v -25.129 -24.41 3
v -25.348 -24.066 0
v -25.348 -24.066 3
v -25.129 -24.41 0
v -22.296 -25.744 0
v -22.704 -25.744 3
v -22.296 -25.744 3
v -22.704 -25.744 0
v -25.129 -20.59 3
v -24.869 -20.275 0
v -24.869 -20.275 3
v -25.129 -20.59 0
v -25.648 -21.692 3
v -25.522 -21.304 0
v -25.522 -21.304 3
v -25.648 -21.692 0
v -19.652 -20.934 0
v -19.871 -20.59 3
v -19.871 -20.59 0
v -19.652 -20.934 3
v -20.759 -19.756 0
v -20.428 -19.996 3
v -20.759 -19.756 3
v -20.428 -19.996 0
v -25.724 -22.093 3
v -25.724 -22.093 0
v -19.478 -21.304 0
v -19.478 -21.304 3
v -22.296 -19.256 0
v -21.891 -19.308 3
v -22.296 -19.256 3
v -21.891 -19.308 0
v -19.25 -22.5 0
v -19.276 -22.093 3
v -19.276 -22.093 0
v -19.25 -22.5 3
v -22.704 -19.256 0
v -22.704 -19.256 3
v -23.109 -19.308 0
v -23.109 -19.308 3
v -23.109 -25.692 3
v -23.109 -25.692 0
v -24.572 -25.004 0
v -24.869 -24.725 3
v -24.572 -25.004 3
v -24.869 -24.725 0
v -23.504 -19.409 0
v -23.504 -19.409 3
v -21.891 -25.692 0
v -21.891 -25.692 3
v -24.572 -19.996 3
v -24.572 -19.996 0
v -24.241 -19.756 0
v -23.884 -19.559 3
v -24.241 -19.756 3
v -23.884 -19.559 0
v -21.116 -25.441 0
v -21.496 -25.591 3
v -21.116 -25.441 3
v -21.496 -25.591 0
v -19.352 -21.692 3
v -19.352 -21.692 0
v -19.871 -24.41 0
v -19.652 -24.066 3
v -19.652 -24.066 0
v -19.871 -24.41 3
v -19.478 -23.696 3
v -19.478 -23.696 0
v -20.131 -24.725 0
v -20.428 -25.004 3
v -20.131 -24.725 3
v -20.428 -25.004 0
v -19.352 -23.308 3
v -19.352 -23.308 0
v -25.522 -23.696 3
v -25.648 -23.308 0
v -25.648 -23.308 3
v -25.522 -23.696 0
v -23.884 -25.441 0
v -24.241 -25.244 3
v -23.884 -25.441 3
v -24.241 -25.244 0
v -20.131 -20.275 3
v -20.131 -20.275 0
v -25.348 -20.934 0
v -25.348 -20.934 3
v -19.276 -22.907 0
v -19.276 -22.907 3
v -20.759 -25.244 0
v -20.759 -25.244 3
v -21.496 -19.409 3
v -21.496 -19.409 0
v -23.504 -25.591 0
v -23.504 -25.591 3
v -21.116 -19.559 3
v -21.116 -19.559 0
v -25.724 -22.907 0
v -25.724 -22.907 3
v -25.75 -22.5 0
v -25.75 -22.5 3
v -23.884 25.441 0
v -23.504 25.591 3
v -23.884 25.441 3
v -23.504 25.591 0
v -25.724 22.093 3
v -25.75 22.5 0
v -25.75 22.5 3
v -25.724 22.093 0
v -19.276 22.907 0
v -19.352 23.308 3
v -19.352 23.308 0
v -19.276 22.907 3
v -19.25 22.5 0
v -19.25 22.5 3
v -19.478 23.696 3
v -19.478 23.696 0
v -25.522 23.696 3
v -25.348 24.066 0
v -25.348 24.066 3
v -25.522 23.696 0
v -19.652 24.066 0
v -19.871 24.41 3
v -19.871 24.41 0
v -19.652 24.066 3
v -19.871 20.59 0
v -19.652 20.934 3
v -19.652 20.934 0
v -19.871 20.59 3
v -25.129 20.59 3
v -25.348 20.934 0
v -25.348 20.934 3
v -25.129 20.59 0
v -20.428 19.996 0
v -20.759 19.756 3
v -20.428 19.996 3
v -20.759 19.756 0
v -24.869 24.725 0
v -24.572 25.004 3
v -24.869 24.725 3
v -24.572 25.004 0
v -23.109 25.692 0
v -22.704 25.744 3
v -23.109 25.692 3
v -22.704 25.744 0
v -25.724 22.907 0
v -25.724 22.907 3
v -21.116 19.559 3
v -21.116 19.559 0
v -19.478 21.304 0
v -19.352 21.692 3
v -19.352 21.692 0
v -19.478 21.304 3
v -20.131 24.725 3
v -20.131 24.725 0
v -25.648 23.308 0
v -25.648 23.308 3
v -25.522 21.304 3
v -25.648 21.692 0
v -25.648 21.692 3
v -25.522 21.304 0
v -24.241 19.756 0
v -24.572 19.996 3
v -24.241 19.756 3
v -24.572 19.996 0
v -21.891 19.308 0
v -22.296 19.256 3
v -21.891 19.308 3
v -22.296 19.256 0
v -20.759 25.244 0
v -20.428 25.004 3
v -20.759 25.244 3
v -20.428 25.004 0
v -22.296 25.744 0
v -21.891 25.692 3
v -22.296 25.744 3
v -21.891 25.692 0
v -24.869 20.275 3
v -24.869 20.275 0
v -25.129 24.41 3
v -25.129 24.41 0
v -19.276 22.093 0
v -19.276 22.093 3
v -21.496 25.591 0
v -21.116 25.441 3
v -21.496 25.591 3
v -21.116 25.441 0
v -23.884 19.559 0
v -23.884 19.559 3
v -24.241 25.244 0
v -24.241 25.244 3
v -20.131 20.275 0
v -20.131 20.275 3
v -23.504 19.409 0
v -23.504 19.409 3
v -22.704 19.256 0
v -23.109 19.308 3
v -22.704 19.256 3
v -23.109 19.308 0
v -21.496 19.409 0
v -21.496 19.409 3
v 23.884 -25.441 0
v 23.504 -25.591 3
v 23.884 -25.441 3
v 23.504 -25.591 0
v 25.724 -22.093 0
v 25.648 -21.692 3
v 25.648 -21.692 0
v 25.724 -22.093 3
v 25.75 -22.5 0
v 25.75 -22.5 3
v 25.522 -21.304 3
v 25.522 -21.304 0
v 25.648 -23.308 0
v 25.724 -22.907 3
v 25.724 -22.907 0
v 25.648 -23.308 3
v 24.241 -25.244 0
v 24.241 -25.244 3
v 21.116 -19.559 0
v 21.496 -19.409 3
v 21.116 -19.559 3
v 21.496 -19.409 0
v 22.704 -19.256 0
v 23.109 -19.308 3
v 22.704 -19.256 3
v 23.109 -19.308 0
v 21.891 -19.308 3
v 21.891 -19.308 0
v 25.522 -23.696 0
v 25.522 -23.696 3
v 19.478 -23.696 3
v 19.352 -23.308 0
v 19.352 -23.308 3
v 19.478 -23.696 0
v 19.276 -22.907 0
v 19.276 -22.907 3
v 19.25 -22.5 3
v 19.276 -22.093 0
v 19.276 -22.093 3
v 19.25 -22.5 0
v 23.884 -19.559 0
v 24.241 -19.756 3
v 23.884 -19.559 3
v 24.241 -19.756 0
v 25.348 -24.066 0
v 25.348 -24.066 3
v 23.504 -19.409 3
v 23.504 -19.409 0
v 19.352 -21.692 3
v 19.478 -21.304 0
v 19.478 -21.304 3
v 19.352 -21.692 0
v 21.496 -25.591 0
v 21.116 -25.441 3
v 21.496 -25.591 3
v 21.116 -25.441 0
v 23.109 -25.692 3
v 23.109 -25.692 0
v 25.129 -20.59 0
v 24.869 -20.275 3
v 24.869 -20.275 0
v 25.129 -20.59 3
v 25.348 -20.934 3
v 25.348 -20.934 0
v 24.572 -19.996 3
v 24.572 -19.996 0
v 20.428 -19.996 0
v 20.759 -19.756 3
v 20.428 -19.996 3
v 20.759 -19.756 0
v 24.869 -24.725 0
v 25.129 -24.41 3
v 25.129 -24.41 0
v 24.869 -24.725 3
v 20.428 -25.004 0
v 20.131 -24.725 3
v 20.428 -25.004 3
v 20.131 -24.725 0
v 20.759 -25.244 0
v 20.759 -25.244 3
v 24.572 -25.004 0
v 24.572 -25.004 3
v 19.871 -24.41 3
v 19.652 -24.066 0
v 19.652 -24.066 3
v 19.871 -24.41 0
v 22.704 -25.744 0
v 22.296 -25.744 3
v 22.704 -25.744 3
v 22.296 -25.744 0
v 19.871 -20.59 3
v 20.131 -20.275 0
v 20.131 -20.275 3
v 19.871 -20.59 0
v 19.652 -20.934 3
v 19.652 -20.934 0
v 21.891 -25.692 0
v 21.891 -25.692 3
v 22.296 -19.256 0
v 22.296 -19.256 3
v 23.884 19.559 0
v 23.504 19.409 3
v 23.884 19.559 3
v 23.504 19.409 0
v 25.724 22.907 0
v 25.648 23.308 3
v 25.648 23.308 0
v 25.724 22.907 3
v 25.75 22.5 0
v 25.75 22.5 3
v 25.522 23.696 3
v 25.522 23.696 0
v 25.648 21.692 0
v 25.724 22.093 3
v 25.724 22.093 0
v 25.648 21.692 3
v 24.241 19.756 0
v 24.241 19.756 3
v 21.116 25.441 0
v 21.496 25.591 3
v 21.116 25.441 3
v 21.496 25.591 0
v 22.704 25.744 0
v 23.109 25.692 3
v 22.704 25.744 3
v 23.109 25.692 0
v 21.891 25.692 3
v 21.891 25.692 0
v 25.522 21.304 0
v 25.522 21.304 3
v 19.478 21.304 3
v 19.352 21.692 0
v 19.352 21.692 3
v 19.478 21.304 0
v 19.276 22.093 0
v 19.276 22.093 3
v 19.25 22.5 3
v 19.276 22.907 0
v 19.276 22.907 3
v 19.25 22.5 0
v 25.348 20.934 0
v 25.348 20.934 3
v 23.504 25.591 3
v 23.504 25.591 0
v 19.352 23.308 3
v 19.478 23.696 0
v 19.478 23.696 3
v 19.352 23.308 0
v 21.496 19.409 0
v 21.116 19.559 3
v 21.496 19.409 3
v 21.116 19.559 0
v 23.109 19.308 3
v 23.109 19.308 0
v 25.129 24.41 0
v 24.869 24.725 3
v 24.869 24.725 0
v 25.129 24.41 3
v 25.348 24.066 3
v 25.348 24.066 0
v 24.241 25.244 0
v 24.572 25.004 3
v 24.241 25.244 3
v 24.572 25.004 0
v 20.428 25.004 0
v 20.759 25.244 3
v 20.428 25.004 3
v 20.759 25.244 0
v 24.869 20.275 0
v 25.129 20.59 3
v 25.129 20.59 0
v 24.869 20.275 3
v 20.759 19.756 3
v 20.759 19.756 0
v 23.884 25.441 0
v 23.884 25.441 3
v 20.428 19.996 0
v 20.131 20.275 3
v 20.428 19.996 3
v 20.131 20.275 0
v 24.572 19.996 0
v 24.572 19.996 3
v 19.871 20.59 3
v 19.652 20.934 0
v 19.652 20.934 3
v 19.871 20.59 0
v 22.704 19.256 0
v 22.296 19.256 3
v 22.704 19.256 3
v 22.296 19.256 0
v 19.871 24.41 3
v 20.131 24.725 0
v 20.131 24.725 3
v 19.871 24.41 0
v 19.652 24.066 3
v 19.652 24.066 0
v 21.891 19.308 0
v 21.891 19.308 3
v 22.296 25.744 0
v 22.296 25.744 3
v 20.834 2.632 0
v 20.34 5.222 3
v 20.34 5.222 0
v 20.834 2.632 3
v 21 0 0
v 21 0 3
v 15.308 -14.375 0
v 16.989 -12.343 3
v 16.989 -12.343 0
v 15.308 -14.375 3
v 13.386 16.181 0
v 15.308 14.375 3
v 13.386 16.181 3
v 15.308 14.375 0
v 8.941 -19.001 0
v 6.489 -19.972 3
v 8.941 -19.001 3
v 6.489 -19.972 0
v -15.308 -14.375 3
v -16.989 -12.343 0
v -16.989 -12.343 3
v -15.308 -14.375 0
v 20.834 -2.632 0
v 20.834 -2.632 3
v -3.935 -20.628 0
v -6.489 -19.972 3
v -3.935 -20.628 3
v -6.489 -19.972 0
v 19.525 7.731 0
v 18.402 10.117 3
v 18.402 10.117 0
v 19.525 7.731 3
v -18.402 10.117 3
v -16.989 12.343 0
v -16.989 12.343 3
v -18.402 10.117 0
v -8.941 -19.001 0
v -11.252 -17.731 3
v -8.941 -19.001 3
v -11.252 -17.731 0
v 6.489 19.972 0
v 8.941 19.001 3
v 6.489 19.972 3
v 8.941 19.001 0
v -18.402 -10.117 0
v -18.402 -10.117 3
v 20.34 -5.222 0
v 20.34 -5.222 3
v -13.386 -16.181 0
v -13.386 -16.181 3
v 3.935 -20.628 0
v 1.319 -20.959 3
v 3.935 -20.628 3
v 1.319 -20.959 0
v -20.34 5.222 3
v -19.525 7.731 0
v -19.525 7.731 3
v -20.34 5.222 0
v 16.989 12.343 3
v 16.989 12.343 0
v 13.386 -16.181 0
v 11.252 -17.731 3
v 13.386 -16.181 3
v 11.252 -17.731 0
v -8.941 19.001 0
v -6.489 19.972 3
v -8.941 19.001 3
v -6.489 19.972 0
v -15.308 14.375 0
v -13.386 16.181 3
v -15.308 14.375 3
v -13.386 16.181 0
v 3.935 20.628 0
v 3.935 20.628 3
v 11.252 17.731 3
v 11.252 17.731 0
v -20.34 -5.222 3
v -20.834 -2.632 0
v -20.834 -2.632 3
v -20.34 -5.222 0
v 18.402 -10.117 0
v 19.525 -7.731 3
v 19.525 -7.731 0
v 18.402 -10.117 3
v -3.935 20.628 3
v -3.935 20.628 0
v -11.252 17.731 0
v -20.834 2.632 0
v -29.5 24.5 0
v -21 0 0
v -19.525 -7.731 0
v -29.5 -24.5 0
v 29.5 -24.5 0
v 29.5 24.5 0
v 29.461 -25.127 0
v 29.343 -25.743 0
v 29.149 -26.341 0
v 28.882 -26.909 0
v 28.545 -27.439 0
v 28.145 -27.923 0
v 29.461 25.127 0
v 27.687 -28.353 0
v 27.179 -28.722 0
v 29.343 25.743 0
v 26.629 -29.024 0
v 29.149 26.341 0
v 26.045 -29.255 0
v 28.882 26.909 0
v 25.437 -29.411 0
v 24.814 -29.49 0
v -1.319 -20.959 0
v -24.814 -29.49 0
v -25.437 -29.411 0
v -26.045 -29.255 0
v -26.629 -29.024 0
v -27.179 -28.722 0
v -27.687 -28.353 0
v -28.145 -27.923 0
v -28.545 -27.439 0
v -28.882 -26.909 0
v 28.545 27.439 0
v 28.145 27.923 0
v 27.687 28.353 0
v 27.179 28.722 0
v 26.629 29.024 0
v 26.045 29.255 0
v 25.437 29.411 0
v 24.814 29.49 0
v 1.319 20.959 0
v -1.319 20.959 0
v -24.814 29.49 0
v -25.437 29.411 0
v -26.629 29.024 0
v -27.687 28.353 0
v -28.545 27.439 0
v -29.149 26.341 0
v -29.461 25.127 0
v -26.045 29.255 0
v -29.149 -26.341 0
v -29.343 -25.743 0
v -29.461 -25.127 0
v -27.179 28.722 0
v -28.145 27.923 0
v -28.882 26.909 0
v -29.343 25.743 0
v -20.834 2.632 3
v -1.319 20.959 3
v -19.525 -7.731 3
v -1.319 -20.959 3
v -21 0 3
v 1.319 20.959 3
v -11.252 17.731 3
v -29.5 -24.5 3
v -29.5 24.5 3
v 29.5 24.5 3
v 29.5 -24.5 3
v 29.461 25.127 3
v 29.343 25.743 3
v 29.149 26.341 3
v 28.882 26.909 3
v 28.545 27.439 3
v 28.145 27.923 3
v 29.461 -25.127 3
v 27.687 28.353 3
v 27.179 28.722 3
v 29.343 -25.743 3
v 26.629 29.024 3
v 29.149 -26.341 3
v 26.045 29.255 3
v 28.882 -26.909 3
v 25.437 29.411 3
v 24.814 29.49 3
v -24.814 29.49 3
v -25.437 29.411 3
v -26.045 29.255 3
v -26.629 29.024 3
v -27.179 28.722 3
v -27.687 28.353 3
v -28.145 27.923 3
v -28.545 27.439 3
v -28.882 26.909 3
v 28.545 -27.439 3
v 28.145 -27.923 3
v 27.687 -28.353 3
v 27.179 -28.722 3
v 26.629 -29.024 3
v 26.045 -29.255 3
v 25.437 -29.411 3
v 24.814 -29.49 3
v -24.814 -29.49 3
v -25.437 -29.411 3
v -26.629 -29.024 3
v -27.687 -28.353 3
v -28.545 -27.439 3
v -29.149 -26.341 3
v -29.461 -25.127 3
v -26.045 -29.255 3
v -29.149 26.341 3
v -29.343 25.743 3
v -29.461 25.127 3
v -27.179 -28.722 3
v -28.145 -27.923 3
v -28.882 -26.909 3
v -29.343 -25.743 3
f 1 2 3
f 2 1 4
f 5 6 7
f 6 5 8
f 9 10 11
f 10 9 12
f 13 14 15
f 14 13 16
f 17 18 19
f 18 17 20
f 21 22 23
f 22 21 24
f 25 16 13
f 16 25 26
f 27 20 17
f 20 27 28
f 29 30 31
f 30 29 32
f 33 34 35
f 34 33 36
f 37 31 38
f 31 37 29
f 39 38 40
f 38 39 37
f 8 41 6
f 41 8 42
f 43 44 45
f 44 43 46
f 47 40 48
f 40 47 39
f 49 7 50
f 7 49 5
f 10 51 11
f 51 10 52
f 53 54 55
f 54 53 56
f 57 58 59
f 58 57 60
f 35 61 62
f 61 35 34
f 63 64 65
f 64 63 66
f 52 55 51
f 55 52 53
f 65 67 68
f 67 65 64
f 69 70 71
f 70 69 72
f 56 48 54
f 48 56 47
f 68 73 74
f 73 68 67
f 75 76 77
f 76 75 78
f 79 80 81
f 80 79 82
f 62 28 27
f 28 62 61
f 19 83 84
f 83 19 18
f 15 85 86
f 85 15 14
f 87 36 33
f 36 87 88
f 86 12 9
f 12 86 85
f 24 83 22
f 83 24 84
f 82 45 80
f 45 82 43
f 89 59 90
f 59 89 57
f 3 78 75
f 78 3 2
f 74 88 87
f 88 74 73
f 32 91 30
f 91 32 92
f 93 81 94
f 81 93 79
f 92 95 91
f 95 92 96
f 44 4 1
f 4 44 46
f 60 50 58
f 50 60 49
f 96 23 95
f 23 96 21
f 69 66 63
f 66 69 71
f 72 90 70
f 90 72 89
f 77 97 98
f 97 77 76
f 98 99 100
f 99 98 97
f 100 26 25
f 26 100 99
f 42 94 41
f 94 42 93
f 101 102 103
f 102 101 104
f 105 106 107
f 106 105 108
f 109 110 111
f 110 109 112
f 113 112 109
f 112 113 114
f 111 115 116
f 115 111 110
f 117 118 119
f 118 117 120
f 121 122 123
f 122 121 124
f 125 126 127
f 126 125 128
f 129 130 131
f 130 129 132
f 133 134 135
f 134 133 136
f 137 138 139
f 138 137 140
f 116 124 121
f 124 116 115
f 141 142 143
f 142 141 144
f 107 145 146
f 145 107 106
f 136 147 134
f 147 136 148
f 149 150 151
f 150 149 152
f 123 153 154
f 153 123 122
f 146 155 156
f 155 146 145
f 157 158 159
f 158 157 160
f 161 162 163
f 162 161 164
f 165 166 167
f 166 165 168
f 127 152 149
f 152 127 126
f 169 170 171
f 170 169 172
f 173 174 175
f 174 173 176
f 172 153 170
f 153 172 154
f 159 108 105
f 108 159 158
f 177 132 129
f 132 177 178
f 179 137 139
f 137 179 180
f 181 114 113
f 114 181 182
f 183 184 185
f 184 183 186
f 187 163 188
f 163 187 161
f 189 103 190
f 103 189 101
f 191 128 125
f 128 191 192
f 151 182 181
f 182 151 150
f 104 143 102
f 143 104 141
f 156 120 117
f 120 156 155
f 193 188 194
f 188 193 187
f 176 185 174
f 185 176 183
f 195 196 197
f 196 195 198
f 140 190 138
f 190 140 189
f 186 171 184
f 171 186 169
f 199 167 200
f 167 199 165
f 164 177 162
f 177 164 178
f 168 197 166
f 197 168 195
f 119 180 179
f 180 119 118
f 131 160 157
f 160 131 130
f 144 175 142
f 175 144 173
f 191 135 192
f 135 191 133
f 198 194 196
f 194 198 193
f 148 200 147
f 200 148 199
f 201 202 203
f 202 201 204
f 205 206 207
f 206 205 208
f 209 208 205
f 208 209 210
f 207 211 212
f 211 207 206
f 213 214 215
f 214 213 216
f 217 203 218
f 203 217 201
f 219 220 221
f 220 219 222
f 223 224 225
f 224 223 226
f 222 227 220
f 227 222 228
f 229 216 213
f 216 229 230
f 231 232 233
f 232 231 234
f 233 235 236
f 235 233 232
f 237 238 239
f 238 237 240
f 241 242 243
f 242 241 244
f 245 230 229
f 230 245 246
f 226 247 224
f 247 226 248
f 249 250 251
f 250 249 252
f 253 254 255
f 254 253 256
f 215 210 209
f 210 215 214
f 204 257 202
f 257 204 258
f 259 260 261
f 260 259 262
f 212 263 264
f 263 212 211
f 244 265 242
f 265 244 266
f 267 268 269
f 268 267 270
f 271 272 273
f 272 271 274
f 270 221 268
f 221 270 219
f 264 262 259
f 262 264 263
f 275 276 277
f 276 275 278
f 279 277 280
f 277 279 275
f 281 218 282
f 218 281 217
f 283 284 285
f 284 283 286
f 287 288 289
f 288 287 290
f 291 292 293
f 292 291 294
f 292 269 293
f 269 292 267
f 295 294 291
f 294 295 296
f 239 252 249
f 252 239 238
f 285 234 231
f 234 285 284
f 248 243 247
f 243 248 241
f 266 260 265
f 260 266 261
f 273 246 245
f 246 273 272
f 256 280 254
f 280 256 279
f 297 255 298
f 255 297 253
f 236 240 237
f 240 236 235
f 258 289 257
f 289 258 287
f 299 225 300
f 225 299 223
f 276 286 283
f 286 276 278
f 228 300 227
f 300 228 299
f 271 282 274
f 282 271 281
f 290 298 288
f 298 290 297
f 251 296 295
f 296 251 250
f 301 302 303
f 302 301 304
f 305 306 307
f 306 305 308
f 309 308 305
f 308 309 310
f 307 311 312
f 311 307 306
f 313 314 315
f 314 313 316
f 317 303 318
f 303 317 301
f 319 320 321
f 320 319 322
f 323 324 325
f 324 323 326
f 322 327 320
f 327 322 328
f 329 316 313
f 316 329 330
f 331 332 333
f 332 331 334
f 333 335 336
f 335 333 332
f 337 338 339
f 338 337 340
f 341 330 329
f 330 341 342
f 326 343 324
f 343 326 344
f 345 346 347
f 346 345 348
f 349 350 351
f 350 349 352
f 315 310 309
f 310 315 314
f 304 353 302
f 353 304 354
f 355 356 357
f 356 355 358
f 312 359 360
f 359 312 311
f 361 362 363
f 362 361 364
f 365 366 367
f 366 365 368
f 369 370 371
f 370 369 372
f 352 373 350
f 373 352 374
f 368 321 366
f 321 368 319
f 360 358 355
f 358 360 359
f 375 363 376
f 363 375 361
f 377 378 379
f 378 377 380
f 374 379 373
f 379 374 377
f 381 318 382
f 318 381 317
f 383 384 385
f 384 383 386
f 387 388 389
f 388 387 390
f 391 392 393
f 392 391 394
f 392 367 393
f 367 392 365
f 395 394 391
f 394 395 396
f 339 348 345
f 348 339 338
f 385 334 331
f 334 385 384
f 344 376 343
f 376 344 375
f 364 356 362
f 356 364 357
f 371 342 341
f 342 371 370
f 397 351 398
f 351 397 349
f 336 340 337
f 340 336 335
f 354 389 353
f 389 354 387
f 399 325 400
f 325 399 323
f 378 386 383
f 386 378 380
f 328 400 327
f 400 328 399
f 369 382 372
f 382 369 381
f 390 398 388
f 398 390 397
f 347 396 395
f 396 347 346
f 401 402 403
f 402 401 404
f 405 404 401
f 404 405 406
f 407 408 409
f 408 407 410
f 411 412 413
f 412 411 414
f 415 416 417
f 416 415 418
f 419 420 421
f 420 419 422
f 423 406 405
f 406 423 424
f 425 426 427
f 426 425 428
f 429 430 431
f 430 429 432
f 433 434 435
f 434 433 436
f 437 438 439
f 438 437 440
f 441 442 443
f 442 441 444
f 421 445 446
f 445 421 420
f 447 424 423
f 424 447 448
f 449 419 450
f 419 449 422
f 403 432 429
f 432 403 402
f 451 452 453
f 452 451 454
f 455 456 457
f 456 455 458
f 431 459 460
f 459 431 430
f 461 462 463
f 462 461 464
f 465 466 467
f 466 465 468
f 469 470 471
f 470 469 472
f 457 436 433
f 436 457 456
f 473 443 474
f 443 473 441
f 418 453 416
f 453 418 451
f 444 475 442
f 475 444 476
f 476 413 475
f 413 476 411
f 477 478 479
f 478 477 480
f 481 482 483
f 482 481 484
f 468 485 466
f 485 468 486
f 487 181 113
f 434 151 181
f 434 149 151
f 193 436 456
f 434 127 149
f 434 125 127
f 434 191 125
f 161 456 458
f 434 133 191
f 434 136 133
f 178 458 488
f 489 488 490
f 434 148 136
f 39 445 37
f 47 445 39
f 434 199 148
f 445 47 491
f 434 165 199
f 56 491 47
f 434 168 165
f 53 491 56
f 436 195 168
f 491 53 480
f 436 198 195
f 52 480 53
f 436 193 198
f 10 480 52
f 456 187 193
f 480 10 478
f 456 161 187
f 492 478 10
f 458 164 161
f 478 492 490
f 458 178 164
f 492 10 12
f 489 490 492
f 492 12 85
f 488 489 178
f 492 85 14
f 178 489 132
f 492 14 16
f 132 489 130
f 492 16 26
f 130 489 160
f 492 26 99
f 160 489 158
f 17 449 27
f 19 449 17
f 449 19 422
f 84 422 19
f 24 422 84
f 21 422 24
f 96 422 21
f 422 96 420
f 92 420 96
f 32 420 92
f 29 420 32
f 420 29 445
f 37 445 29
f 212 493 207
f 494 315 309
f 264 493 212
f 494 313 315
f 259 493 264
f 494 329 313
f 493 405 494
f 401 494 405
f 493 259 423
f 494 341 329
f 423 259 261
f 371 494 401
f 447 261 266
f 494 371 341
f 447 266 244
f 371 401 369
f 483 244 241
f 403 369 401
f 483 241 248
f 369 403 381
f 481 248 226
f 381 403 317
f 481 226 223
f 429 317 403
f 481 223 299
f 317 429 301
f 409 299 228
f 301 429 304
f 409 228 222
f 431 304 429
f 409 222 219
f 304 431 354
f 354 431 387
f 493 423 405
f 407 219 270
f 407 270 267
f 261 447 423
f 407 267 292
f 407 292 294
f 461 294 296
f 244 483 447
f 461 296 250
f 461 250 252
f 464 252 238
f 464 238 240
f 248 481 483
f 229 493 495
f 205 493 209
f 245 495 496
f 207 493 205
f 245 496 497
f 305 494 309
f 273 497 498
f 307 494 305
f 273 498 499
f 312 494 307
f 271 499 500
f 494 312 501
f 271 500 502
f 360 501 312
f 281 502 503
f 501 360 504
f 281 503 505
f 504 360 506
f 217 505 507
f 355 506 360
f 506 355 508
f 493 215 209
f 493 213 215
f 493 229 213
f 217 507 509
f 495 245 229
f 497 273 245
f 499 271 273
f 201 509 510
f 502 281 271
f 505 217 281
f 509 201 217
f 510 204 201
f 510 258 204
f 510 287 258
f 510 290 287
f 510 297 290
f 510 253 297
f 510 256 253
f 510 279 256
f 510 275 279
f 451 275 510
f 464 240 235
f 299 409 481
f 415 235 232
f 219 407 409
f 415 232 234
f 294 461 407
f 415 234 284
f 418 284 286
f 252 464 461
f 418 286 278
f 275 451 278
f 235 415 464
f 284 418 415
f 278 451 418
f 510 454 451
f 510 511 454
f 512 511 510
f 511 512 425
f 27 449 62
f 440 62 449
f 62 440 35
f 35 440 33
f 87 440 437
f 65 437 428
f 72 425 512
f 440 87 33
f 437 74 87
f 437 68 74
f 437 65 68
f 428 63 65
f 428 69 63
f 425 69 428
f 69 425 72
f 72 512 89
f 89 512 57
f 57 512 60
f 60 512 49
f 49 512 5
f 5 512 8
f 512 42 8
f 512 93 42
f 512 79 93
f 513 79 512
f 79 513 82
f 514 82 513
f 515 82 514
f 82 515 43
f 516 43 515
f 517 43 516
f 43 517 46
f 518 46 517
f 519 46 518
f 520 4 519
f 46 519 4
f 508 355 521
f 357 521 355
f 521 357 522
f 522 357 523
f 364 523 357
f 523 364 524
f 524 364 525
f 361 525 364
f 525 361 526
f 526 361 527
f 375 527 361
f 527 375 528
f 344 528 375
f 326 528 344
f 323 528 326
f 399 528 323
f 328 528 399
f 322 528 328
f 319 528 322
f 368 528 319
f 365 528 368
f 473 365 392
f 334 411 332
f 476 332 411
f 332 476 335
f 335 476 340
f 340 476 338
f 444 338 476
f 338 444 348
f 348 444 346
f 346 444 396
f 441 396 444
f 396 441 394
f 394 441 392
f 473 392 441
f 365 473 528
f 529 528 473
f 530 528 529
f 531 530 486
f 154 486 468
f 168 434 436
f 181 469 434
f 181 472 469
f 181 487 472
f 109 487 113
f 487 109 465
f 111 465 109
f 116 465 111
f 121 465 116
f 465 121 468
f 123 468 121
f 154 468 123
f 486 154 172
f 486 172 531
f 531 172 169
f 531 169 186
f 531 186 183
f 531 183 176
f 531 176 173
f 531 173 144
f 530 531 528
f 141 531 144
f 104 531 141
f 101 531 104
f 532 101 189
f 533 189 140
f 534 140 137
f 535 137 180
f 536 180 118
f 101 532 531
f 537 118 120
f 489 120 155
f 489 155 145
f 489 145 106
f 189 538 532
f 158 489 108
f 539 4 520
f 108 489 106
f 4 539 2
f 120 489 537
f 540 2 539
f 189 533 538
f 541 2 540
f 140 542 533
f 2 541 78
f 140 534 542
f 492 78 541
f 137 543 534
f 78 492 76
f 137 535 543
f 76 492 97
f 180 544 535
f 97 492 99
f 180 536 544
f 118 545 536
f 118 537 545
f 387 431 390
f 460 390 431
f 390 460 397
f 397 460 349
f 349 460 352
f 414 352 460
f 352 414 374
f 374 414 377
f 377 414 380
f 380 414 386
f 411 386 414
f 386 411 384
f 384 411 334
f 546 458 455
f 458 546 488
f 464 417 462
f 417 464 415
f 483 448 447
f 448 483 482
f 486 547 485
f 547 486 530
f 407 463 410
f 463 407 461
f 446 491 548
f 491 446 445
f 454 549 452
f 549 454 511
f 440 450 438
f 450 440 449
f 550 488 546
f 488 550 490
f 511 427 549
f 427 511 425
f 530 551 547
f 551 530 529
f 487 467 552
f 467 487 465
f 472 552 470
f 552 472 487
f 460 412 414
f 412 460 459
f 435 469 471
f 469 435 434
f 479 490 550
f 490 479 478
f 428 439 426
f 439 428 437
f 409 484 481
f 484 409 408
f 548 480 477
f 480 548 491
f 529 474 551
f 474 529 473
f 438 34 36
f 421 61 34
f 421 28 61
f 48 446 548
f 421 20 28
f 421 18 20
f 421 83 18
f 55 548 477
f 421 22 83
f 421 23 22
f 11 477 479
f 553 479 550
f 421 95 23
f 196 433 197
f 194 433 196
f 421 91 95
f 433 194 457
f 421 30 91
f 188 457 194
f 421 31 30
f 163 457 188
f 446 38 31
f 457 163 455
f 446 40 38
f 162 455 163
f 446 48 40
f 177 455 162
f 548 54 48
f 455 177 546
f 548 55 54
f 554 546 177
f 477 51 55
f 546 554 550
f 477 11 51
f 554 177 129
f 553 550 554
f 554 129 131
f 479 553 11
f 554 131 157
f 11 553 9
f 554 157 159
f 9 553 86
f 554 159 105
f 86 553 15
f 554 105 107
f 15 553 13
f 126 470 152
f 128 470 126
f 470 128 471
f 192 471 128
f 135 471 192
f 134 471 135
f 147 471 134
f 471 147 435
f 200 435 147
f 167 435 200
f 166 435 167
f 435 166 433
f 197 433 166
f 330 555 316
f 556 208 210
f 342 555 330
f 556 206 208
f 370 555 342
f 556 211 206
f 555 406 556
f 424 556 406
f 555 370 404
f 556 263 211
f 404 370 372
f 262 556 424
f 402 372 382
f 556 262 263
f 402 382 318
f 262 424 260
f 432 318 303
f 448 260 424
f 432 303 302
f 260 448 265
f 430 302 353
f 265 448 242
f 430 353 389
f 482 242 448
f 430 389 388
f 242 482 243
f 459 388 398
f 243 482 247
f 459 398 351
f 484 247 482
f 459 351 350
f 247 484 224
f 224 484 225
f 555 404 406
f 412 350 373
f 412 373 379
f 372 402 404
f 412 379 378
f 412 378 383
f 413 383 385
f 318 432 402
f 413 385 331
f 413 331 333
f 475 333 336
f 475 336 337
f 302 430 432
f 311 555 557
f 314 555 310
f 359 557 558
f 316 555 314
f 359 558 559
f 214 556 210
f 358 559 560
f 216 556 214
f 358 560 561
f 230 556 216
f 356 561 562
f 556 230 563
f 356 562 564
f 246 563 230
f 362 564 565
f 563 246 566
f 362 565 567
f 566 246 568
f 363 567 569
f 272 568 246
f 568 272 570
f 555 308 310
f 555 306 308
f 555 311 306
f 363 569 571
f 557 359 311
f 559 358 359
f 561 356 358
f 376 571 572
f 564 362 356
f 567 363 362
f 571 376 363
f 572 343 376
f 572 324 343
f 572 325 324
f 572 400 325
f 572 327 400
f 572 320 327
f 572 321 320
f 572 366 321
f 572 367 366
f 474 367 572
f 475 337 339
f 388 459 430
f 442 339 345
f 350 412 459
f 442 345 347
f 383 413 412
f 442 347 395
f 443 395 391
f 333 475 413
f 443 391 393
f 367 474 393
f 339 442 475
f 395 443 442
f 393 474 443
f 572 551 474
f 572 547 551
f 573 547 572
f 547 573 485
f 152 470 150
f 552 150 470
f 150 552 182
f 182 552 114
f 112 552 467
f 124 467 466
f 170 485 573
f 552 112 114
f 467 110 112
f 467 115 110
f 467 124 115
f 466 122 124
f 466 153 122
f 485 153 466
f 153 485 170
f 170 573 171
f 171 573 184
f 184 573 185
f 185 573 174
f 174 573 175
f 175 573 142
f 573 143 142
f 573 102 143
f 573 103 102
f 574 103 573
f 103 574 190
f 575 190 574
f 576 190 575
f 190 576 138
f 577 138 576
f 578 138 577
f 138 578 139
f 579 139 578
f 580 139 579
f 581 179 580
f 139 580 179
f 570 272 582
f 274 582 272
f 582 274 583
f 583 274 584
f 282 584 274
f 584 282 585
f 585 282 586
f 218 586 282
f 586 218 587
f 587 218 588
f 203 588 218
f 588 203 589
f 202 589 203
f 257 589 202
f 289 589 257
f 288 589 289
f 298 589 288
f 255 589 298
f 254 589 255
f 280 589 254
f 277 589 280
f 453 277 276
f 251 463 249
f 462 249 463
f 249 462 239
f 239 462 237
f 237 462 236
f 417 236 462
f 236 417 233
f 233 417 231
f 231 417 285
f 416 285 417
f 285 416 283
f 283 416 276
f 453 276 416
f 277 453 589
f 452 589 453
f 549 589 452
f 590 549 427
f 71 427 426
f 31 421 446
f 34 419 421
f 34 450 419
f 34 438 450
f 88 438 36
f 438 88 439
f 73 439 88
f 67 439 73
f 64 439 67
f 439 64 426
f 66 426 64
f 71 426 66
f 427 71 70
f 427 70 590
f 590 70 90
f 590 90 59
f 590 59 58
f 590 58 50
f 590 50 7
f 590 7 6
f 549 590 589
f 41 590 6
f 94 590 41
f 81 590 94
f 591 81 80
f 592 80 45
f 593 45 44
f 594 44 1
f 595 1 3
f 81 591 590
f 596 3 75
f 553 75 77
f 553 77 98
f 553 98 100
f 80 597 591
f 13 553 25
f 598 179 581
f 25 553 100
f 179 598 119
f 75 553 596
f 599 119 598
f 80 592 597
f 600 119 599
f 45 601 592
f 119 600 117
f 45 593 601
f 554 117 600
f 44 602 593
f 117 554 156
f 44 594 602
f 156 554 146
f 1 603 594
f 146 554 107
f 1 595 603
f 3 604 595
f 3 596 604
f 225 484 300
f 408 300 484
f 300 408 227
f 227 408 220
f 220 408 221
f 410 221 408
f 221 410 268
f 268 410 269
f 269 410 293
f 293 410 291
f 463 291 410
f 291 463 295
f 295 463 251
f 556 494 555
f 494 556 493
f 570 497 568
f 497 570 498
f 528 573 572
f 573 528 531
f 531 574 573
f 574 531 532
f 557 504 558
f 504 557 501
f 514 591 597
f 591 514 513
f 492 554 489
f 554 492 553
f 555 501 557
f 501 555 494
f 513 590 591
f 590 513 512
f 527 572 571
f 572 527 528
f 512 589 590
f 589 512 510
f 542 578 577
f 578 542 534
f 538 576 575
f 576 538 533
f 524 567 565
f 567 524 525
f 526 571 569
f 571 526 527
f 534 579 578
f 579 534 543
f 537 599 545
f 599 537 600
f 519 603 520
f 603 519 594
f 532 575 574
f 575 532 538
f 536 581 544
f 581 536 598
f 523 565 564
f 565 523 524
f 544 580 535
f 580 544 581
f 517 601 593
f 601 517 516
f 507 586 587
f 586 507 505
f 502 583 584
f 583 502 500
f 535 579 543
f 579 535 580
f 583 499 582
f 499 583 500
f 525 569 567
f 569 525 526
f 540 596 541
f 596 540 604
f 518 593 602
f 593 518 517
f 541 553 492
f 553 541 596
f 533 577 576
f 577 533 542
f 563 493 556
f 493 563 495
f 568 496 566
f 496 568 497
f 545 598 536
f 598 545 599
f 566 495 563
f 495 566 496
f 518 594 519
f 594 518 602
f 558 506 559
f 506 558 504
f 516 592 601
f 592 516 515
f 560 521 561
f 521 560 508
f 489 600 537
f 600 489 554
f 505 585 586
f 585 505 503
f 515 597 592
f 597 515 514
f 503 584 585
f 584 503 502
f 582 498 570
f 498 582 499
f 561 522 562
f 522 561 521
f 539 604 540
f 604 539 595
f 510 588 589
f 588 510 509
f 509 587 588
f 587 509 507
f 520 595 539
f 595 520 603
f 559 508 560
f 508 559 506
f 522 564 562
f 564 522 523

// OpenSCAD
$fn = 50;


difference() {
	union() {
		hull() {
			translate(v = [-24.5000000000, 24.5000000000, 0]) {
				cylinder(h = 3, r = 5);
			}
			translate(v = [24.5000000000, 24.5000000000, 0]) {
				cylinder(h = 3, r = 5);
			}
			translate(v = [-24.5000000000, -24.5000000000, 0]) {
				cylinder(h = 3, r = 5);
			}
			translate(v = [24.5000000000, -24.5000000000, 0]) {
				cylinder(h = 3, r = 5);
			}
		}
	}
	union() {
		#translate(v = [-22.5000000000, -22.5000000000, -100.0000000000]) {
			cylinder(h = 200, r = 3.2500000000);
		}
		#translate(v = [-22.5000000000, 22.5000000000, -100.0000000000]) {
			cylinder(h = 200, r = 3.2500000000);
		}
		#translate(v = [22.5000000000, -22.5000000000, -100.0000000000]) {
			cylinder(h = 200, r = 3.2500000000);
		}
		#translate(v = [22.5000000000, 22.5000000000, -100.0000000000]) {
			cylinder(h = 200, r = 3.2500000000);
		}
		#cylinder(h = 3, r = 21.0000000000);
	}
}
